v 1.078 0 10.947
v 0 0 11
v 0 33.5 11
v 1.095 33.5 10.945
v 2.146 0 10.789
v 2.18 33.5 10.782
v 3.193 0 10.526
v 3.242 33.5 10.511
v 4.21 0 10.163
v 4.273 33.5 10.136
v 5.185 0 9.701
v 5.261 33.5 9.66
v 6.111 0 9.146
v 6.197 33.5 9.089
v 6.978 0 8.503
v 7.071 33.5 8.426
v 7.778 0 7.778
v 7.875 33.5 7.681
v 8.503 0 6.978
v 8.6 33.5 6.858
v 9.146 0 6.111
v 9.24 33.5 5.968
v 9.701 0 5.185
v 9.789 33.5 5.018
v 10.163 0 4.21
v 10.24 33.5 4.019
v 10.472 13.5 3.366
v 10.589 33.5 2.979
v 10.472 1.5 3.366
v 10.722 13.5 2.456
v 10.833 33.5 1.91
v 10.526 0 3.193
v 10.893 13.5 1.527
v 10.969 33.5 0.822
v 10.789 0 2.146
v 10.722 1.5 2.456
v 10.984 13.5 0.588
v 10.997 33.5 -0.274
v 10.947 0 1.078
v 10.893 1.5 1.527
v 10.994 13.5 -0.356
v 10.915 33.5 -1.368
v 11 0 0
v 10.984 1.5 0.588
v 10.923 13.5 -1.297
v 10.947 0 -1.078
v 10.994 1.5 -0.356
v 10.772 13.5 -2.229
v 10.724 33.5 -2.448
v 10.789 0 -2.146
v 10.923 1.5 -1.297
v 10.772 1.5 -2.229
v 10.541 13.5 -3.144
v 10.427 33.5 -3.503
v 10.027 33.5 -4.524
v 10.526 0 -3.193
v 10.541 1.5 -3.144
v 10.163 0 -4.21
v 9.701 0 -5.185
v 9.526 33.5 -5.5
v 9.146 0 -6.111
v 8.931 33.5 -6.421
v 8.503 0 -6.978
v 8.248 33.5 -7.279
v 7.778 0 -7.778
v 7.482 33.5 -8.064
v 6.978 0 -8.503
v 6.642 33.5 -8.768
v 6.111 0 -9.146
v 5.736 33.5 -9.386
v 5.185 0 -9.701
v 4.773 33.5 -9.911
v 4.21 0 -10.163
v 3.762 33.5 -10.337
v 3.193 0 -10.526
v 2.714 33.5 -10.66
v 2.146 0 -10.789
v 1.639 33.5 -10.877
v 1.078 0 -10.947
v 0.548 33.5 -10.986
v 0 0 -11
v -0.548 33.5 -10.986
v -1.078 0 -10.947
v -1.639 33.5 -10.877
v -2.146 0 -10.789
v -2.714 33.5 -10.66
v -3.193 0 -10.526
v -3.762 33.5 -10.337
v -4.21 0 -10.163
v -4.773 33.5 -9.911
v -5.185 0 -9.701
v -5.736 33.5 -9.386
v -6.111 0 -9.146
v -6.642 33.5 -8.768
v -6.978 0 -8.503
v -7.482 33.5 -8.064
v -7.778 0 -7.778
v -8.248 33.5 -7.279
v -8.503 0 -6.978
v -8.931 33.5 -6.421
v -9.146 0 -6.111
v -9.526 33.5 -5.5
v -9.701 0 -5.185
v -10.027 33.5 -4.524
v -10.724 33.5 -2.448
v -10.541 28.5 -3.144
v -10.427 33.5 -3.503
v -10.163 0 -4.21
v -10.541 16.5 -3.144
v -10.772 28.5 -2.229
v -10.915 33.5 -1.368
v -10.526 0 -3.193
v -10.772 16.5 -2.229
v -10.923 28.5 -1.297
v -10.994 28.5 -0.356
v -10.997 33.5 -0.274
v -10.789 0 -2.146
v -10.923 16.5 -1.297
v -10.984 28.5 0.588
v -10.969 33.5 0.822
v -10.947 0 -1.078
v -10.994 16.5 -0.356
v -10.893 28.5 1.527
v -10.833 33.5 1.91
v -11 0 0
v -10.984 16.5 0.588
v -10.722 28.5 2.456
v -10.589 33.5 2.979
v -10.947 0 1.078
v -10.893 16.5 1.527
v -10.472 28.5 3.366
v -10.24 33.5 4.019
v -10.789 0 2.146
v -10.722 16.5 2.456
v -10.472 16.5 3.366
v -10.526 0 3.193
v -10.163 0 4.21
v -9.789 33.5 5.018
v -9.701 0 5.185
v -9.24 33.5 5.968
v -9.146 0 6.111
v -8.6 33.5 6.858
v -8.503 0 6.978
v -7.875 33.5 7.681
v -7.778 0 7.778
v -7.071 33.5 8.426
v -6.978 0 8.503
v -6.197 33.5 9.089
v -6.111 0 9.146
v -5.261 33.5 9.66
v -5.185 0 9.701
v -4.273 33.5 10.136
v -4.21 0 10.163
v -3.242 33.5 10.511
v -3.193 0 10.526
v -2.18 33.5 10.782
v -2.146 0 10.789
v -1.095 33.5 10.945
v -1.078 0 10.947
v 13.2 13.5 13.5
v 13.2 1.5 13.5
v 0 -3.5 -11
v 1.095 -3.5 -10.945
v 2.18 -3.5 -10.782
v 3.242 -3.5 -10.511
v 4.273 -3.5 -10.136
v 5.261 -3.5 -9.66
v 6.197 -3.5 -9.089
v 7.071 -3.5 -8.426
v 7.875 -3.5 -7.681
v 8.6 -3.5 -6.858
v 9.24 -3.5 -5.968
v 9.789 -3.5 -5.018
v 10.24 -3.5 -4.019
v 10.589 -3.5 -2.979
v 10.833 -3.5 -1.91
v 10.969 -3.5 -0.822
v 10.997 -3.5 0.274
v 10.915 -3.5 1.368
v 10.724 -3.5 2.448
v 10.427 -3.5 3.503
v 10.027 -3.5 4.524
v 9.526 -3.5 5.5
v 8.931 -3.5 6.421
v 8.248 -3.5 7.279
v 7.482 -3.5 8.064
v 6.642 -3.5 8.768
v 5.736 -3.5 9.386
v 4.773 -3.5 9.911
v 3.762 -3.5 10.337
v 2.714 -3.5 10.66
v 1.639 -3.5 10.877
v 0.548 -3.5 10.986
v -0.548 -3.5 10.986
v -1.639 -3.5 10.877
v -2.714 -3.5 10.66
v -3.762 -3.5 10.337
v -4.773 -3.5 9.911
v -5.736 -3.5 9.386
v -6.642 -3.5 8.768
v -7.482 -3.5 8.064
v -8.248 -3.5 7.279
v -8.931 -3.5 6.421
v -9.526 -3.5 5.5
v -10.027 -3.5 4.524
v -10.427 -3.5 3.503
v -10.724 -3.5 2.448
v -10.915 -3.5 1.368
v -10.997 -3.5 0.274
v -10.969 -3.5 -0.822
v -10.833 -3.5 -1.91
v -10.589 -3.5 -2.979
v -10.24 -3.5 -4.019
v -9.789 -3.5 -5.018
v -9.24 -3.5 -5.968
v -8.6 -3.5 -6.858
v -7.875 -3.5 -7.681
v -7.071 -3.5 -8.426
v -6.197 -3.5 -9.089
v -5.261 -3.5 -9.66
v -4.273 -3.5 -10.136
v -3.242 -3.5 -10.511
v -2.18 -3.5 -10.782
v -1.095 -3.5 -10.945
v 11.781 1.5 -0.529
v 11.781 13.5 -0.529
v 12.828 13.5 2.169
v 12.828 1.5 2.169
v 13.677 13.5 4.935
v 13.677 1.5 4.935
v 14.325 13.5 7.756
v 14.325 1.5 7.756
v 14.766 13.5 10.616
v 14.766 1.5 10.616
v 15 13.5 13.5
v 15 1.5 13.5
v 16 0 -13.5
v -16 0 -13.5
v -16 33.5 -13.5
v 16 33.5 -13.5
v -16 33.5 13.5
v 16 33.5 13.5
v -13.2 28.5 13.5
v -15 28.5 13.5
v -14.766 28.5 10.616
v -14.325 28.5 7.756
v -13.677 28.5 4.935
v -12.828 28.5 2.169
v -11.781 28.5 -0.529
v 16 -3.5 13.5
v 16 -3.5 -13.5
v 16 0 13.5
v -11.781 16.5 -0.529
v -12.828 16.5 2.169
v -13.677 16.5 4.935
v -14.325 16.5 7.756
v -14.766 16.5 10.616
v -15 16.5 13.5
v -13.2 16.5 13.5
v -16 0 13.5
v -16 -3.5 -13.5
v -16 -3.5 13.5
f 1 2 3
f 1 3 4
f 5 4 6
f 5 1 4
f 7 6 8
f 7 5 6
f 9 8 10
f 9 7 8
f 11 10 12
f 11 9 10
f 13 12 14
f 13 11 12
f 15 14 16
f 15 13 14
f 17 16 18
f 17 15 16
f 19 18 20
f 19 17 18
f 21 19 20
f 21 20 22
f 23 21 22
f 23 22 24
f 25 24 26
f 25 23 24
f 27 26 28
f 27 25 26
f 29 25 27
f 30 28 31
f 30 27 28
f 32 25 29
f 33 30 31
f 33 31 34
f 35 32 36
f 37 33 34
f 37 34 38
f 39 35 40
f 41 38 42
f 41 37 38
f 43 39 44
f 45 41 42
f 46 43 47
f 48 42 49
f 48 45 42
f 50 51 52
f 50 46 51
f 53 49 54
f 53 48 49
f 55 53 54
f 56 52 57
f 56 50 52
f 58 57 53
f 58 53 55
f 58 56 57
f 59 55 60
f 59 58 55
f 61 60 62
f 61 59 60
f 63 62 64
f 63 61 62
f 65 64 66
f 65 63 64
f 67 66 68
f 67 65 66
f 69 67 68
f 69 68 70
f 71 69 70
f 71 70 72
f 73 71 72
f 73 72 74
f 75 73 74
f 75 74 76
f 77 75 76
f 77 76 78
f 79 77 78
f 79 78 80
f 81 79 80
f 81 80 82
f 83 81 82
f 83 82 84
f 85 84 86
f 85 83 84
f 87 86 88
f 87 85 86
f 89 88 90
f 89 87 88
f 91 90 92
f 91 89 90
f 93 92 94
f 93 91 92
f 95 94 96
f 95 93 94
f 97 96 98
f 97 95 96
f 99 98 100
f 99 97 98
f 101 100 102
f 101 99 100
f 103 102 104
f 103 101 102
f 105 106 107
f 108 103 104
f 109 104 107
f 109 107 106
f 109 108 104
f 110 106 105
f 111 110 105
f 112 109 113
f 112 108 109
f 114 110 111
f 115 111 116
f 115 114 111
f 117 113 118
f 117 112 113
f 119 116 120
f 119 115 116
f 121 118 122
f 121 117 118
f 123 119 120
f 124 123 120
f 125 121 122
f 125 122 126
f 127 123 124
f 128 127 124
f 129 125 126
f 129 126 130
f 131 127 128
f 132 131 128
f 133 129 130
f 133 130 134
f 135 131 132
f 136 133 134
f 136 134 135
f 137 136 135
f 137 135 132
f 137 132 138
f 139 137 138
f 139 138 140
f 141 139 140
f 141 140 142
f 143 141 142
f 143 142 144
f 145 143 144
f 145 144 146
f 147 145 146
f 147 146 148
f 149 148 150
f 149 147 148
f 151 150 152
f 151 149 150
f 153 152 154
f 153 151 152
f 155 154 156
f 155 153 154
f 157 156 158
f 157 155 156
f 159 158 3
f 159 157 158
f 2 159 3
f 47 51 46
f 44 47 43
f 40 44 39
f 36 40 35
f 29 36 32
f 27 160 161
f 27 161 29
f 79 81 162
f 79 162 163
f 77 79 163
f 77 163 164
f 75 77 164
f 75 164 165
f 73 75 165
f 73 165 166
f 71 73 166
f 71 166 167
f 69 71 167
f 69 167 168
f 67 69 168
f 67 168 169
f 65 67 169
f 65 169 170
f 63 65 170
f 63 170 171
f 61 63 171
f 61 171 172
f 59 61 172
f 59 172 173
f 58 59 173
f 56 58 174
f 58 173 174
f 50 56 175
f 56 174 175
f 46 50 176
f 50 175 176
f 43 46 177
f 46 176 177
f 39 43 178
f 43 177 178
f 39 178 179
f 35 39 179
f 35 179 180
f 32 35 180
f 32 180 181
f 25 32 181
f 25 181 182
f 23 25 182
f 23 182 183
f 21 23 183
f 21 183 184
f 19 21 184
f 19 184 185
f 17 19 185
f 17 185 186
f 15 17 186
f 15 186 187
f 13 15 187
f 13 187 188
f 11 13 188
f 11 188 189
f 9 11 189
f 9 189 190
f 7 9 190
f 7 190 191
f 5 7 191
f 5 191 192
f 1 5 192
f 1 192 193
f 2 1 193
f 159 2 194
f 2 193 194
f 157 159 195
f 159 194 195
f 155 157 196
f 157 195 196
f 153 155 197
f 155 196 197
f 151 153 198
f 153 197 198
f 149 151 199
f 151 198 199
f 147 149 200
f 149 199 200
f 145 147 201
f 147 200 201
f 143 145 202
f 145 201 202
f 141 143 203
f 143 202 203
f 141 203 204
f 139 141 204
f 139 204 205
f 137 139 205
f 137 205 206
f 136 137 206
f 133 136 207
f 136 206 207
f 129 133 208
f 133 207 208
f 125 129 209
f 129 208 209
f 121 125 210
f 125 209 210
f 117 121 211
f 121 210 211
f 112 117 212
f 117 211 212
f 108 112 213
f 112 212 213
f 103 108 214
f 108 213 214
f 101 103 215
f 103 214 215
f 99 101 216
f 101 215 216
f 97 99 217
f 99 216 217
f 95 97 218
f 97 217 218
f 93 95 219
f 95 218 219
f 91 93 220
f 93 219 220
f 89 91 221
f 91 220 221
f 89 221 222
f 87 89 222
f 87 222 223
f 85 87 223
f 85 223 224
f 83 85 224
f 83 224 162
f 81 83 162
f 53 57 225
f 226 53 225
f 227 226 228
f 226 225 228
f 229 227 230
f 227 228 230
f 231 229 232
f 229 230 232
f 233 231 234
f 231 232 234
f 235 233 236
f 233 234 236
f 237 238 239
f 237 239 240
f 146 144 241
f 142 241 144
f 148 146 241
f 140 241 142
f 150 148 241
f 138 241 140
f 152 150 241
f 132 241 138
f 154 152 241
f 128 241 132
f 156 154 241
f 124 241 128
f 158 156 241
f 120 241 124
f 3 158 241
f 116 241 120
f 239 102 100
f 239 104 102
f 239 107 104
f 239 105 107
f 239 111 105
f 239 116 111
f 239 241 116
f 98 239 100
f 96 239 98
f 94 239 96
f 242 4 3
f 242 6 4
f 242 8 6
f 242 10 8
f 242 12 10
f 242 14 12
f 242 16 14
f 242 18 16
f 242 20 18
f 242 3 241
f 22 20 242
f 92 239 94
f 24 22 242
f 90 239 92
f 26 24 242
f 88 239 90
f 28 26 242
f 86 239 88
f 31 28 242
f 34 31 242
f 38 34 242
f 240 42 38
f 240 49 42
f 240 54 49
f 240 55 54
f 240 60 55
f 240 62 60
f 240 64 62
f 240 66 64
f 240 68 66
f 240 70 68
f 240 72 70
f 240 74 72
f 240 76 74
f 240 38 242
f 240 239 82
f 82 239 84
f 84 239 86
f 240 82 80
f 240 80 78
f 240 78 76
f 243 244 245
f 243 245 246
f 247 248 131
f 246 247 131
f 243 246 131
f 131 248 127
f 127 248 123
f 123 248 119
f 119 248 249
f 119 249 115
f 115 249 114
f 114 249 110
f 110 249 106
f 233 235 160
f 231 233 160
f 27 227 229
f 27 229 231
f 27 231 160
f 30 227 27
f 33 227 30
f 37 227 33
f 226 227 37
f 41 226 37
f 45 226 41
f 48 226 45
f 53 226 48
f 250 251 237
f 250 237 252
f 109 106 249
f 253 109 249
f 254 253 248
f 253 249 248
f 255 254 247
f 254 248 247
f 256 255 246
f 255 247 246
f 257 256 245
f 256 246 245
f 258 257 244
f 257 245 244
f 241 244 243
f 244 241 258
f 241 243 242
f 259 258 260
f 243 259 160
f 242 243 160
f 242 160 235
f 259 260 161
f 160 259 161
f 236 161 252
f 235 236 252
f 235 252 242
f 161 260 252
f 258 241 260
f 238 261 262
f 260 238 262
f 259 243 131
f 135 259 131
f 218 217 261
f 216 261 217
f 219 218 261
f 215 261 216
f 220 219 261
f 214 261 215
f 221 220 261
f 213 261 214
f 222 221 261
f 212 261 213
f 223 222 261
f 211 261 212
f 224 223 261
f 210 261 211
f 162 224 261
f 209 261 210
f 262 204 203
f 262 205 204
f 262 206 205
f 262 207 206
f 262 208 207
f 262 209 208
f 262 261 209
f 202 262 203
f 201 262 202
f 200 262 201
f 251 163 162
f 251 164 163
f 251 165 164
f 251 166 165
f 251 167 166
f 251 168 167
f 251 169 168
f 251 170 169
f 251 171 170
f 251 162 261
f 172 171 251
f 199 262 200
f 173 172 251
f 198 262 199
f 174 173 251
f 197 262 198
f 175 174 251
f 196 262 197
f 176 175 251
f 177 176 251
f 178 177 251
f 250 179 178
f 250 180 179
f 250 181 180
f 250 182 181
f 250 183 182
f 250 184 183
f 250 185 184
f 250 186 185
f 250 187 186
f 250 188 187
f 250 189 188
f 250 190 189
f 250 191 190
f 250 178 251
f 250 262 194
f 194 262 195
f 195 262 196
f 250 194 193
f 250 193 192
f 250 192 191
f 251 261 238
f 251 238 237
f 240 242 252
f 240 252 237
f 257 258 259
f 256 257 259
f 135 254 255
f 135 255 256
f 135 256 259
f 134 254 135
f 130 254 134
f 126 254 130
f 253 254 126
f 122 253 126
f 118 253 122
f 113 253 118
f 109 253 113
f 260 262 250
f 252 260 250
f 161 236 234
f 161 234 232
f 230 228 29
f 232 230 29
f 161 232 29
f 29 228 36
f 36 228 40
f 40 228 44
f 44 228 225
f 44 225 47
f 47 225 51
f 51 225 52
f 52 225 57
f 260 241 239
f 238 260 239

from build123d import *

# Parameters (mm, degrees)
SKETCH1_W           = 32
SKETCH1_H           = 27
SKETCH1_R           = 11
BOSS_EXTRUDE1_DEPTH = 30
CUT_EXTRUDE2_DEPTH  = 12
CIRPATTERN2_COUNT   = 2
SKETCH7_W           = 32
SKETCH7_H           = 27
SKETCH7_R           = 11
BOSS_EXTRUDE2_DEPTH = 3.5
BOSS_EXTRUDE3_START = 3.5
SKETCH8_W           = 32
SKETCH8_H           = 27
SKETCH8_R           = 11
BOSS_EXTRUDE3_DEPTH = 3.5


with BuildPart() as part:
    # Sketch1 → Boss-Extrude1 (new body)
    with BuildSketch(Plane(origin=(0, 0, 0), x_dir=(1, 0, 0), z_dir=(0, 1, 0))):
        Rectangle(SKETCH1_W, SKETCH1_H)
        Circle(SKETCH1_R, mode=Mode.SUBTRACT)
    extrude(amount=BOSS_EXTRUDE1_DEPTH)

    # Sketch4 → Cut-Extrude2 (cut)
    with BuildSketch(Plane(origin=(0, 28.5, 0), x_dir=(1, 0, 0), z_dir=(0, 1, 0))):
        with BuildLine():
            Line((-13.2, -13.5), (-8.943538475, 2.314781316))
            Line((-8.943538475, 2.314781316), (-10.541084547, 3.144127315))
            ThreePointArc((-10.541084547, 3.144127315), (-13.677421735, -4.934985855), (-15, -13.5))
            Line((-15, -13.5), (-13.2, -13.5))
        make_face()
    cut_extrude2 = extrude(amount=-CUT_EXTRUDE2_DEPTH, mode=Mode.SUBTRACT)

    # CirPattern2: Cut-Extrude2 ×2 about axis
    cirpattern2_axis = Axis((0, 15, 28.768716551), (0, 0, -1))
    for i in range(1, CIRPATTERN2_COUNT):
        add(cut_extrude2.rotate(cirpattern2_axis, i * 360 / CIRPATTERN2_COUNT), mode=Mode.SUBTRACT)

    # Sketch7 → Boss-Extrude2 (add)
    with BuildSketch(Plane(origin=(0, 30, 0), x_dir=(1, 0, 0), z_dir=(0, 1, 0))):
        Rectangle(SKETCH7_W, SKETCH7_H)
        Circle(SKETCH7_R, mode=Mode.SUBTRACT)
    extrude(amount=BOSS_EXTRUDE2_DEPTH)

    # Sketch8 → Boss-Extrude3 (add)
    with BuildSketch(Plane.XZ.offset(BOSS_EXTRUDE3_START)):
        Rectangle(SKETCH8_W, SKETCH8_H)
        Circle(SKETCH8_R, mode=Mode.SUBTRACT)
    extrude(amount=-BOSS_EXTRUDE3_DEPTH)


solid = part.part
